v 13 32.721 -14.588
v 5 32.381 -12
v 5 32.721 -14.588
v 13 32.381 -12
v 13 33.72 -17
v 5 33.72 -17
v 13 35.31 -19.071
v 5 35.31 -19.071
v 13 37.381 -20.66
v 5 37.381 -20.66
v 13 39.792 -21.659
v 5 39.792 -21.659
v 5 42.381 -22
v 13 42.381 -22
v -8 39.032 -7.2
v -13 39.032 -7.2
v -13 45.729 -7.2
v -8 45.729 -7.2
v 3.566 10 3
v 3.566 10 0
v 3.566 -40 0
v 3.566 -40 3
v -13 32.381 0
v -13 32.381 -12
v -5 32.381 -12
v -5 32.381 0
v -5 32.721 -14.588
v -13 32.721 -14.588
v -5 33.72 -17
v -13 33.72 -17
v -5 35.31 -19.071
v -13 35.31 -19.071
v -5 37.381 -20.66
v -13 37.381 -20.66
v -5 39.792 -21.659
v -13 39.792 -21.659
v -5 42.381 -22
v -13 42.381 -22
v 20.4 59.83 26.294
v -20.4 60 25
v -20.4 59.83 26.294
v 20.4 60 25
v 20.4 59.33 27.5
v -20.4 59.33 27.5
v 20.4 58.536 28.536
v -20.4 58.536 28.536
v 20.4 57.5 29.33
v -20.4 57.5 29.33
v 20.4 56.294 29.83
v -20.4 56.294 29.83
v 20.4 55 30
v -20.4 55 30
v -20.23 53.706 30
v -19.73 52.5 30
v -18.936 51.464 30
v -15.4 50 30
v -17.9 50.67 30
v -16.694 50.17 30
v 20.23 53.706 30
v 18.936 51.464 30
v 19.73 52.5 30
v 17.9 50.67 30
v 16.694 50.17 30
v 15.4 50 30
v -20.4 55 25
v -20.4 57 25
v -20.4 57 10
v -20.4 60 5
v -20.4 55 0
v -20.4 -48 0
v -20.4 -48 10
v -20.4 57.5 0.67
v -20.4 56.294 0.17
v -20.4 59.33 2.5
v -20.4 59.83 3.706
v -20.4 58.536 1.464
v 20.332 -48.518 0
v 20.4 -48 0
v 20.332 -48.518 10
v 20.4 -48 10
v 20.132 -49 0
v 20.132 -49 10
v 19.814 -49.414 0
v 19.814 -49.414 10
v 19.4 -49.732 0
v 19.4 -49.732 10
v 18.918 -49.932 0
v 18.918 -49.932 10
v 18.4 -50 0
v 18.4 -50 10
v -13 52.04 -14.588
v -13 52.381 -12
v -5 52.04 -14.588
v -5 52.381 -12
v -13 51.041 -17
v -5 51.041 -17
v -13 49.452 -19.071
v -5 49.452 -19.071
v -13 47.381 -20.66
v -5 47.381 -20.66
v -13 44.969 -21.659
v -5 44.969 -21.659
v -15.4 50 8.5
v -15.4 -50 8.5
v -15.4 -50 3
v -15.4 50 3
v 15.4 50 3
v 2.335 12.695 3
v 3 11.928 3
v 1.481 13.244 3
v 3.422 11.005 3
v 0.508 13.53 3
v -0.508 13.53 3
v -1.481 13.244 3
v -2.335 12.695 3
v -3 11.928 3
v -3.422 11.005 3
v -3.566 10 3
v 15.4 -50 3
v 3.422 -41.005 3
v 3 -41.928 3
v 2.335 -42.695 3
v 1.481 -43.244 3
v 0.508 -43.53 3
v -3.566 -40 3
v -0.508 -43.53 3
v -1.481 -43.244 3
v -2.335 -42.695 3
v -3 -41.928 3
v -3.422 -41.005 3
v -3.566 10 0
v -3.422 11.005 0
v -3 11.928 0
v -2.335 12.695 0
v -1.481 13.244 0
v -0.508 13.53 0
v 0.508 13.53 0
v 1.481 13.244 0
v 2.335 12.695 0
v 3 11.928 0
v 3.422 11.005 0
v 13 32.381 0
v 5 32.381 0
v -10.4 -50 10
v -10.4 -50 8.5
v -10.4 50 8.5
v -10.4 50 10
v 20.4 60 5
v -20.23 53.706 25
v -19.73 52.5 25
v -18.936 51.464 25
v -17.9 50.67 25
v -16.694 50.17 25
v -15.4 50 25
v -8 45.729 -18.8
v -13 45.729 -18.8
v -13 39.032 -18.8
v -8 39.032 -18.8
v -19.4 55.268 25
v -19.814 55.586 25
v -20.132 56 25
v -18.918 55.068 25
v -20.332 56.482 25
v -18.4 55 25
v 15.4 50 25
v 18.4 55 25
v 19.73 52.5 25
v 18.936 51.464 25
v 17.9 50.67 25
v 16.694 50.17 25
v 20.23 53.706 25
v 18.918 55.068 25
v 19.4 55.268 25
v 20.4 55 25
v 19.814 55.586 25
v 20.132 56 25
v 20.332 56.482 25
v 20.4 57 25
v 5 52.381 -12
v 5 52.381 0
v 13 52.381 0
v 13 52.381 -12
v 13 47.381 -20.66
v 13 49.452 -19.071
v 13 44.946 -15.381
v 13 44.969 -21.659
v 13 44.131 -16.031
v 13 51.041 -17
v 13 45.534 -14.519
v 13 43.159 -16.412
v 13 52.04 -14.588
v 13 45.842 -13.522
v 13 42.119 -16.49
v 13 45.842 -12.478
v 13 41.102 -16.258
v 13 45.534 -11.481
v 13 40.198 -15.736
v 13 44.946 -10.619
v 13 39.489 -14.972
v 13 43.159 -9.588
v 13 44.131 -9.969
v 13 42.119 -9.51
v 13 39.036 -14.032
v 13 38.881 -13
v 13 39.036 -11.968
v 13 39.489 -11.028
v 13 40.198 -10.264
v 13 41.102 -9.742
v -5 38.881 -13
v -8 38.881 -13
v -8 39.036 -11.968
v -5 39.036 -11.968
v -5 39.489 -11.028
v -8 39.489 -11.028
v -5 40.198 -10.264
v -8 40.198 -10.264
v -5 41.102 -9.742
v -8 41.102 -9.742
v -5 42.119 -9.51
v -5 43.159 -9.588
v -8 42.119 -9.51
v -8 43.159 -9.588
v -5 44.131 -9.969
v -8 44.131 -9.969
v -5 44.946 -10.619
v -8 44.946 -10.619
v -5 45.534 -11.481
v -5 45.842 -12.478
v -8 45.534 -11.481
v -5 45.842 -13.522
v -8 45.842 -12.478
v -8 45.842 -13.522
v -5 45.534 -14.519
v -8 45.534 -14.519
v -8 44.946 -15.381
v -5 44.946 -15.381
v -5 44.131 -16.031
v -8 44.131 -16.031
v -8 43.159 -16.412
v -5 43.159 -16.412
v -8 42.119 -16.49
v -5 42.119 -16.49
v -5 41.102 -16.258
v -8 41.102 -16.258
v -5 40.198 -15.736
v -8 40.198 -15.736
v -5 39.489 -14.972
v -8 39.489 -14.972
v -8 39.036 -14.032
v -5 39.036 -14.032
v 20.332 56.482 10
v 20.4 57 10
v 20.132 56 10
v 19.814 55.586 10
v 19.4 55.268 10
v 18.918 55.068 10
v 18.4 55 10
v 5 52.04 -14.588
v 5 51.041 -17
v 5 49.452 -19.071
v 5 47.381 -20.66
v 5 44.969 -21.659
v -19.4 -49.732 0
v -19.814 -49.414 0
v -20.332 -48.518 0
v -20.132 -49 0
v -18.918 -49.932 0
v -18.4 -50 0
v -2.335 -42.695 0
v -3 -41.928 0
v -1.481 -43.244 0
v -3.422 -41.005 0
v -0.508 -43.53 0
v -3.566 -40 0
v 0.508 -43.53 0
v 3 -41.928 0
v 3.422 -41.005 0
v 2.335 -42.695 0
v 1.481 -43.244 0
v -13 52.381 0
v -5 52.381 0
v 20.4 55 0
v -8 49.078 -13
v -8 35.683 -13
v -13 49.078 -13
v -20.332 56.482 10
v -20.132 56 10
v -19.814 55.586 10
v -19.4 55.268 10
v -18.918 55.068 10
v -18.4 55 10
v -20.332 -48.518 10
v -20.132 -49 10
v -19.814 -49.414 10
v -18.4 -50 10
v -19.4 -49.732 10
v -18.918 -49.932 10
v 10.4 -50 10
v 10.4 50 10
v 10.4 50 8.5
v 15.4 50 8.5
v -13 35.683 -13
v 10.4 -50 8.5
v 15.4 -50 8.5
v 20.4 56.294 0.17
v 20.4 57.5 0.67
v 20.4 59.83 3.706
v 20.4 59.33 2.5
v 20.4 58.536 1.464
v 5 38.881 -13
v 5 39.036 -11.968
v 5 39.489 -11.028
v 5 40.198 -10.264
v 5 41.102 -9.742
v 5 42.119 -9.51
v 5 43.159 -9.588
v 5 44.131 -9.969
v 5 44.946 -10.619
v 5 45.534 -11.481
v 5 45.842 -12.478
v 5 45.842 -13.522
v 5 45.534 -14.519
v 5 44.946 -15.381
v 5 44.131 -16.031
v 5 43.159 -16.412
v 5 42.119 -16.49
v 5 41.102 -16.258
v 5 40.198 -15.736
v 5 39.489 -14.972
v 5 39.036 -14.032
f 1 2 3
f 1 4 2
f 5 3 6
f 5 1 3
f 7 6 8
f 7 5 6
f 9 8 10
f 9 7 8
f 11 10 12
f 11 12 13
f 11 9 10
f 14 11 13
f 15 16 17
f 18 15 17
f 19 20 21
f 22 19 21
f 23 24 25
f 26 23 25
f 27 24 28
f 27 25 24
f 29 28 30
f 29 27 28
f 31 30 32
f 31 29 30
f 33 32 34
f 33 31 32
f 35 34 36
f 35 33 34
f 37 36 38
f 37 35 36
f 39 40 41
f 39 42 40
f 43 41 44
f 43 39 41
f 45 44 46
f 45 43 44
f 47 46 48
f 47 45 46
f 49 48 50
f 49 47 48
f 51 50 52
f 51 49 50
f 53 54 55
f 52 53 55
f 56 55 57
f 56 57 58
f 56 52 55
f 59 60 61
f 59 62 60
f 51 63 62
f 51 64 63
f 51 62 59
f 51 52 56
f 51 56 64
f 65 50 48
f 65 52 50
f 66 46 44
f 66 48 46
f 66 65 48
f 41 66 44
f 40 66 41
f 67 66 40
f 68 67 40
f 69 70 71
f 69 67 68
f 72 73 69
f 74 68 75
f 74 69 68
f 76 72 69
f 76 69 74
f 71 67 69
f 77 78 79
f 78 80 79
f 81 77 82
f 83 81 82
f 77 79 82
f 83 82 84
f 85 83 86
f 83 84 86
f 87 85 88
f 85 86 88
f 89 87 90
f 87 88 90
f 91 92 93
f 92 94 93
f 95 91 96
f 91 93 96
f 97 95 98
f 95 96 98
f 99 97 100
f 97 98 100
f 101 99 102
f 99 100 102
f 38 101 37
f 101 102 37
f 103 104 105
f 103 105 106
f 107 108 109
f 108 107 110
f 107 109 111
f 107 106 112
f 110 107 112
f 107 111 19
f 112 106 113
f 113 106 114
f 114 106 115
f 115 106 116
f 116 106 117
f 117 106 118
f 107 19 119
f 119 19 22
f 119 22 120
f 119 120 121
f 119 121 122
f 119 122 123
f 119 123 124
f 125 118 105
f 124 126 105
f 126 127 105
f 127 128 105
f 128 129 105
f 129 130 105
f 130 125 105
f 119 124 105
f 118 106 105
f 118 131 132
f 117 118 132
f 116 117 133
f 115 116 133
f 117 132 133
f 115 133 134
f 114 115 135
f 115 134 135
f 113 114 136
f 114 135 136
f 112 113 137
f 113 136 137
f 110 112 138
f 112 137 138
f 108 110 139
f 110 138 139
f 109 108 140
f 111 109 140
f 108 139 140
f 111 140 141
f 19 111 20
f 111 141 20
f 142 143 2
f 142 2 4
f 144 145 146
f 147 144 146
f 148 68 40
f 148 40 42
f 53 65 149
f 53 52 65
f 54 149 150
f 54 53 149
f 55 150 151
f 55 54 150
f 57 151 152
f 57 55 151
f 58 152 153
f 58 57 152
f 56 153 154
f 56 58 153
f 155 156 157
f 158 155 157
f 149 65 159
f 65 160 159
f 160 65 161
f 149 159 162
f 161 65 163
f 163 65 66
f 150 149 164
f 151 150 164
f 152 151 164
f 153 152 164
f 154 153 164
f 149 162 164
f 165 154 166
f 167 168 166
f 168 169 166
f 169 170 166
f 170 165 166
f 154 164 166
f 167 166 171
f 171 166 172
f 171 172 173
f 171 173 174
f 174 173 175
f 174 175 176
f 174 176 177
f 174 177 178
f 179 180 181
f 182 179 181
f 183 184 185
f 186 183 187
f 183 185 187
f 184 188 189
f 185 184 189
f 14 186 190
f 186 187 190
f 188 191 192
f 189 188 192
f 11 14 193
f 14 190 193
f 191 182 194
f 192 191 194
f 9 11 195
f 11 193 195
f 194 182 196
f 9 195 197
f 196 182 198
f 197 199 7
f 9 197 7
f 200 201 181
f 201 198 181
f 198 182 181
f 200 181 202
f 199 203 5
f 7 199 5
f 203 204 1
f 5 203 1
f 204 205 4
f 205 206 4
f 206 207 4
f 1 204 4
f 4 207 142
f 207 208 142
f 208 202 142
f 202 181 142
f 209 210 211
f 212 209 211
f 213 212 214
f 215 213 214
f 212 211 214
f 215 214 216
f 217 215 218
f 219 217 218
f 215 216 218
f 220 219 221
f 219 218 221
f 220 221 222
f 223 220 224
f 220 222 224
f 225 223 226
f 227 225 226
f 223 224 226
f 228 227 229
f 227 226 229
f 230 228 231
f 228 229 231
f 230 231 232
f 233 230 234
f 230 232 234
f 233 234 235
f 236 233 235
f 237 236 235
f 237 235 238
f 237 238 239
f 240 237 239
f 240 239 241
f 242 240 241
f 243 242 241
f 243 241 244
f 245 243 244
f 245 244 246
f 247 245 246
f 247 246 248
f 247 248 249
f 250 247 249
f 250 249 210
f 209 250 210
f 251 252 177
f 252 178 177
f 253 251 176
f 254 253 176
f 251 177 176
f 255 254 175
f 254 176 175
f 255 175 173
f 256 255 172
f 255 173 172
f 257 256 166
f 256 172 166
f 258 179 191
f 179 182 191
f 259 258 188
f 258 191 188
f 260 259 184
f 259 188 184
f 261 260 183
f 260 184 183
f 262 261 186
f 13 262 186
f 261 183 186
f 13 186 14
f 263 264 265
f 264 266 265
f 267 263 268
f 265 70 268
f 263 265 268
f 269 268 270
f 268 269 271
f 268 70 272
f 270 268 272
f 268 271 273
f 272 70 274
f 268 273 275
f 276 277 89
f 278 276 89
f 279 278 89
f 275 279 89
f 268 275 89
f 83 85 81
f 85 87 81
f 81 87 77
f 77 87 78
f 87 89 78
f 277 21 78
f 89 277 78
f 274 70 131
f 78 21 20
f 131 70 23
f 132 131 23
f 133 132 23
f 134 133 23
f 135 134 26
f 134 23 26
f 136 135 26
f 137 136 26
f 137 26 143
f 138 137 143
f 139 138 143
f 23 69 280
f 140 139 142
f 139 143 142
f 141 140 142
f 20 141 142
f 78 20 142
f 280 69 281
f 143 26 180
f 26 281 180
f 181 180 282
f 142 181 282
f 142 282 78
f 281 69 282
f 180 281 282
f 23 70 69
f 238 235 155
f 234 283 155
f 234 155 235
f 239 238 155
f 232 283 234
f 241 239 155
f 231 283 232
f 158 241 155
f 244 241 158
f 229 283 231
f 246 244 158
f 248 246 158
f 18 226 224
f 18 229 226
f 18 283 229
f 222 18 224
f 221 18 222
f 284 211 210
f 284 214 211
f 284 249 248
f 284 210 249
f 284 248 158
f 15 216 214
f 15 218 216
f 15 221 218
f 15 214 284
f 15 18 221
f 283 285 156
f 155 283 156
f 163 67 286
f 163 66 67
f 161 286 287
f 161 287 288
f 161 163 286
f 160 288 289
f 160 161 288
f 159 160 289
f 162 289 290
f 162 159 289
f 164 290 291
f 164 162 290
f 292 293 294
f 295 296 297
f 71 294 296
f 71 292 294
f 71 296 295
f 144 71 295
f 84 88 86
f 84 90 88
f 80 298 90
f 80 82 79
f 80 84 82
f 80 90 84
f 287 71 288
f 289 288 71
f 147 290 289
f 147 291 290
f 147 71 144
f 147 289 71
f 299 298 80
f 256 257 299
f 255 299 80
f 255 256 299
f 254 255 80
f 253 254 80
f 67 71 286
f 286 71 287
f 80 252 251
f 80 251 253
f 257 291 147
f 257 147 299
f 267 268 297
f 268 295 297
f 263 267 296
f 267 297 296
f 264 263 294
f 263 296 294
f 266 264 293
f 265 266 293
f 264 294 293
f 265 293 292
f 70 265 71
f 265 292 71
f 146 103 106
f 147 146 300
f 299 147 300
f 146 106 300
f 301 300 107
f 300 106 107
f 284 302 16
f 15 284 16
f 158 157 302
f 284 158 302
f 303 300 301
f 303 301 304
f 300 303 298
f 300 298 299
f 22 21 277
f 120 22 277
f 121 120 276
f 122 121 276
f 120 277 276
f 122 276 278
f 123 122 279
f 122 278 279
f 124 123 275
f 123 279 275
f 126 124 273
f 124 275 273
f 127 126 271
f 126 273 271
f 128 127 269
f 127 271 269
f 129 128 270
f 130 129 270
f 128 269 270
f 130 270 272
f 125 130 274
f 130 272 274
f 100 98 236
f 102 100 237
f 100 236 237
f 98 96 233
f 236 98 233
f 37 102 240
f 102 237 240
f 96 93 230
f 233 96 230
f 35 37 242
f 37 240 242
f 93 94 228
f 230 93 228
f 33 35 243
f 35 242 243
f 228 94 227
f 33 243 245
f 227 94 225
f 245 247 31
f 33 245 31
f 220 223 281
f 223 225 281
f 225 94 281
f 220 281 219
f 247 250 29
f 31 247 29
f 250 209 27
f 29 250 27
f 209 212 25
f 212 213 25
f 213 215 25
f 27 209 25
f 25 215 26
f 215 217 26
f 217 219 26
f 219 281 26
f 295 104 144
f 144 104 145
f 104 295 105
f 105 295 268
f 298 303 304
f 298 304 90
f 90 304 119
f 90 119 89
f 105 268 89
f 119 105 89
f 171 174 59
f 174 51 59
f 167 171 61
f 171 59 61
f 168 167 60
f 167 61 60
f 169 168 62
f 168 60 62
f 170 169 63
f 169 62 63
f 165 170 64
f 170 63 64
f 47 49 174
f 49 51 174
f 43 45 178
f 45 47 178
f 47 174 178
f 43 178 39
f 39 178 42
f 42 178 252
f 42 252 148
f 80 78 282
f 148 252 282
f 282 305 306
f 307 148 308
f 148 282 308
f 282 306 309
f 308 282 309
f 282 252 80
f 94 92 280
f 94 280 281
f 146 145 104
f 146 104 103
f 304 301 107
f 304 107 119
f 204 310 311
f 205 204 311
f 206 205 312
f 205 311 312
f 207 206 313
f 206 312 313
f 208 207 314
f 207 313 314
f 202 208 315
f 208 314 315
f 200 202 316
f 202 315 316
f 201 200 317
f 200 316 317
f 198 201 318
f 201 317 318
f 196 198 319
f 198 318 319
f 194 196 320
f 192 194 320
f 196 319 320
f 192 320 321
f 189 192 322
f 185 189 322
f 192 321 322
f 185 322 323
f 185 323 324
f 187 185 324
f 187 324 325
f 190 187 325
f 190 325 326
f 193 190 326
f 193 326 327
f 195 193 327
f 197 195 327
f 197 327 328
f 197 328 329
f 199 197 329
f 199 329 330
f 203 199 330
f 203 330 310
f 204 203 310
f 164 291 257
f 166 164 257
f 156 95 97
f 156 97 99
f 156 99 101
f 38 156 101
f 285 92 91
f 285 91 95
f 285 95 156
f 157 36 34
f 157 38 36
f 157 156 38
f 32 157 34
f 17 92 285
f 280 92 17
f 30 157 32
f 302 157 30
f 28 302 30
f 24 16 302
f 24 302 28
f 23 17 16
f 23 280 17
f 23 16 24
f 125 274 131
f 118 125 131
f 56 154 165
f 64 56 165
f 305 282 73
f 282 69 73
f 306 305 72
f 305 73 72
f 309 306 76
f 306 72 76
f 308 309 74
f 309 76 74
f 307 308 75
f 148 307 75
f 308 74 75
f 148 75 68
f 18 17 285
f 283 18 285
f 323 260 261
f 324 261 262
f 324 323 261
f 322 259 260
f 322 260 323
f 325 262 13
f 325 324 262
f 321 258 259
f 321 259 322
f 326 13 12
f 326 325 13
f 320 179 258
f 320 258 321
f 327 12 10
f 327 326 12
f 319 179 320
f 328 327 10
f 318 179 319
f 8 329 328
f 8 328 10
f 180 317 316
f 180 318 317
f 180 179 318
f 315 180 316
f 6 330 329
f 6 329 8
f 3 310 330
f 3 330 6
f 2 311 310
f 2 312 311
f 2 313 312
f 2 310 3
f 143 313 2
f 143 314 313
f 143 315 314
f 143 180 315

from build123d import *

# Parameters (mm, degrees)
F0_W      = 10
F0_H      = 100
F1_DEPTH  = 10
F0_W_2    = 20.8
F2_DEPTH  = 5
F3_W      = 40.8
F3_H      = 5
F4_DEPTH  = 15
F5_W      = 40.8
F5_H      = 10
F6_DEPTH  = 5
F7_W      = 8
F7_H      = 20
F8_DEPTH  = 22
F9_R      = 3.5
F10_DEPTH = 33.401
F11_DEPTH = 5
F12_R     = 9.99999
F13_R     = 4.99999
F14_R     = 2
F15_W     = 100
F15_H     = 3.5
F16_DEPTH = 5
F17_W     = 100
F17_H     = 3.5
F18_DEPTH = 5
F19_DEPTH = 2


# Not quite as in the source:
# - a fillet or chamfer is up to 0.001 mm smaller than in the source, because OpenCascade refuses the exact size


with BuildPart() as f1:
    # F0 (on Top) → F1 (new body)
    with BuildSketch(Plane.XY):
        with Locations((-15.4, 0)):
            Rectangle(F0_W, F0_H)
        Polygon((-10.4, 50), (10.4, 50), (20.4, 50), (20.4, 60), (-20.4, 60), (-20.4, 50), align=None)
        with Locations((15.4, 0)):
            Rectangle(F0_W, F0_H)
    extrude(amount=F1_DEPTH)

    # F0 (on Top) → F2 (join)
    with BuildSketch(Plane.XY):
        Rectangle(F0_W_2, F0_H)
        with BuildLine():
            Line((3.5661098082, 10), (3.5661098082, -40))
            ThreePointArc((3.5661098082, -40), (0, -43.5661098082), (-3.5661098082, -40))
            Line((-3.5661098082, -40), (-3.5661098082, 10))
            ThreePointArc((-3.5661098082, 10), (0, 13.5661098082), (3.5661098082, 10))
        make_face(mode=Mode.SUBTRACT)
    extrude(amount=F2_DEPTH)

    # F3 (on face) → F4 (join)
    with BuildSketch(Plane.XY.offset(10)):
        with Locations((0, 57.5)):
            Rectangle(F3_W, F3_H)
    extrude(amount=F4_DEPTH)

    # F5 (on face) → F6 (join)
    with BuildSketch(Plane.XY.offset(25)):
        with Locations((0, 55)):
            Rectangle(F5_W, F5_H)
    extrude(amount=F6_DEPTH)

    # F7 (on face) → F8 (join)
    with BuildSketch(Plane(origin=(0, 0, 0), x_dir=(1, 0, 0), z_dir=(0, 0, -1))):
        with Locations((9, -42.3806495965)):
            Rectangle(F7_W, F7_H)
        with Locations((-9, -42.3806495965)):
            Rectangle(F7_W, F7_H)
    extrude(amount=F8_DEPTH)

    # F9 (on face) → F10 (cut, through all)
    with BuildSketch(Plane(origin=(-13, 0, 0), x_dir=(0, -1, 0), z_dir=(-1, 0, 0))):
        with Locations((-42.3806495965, -13)):
            Circle(F9_R)
    extrude(amount=-F10_DEPTH, mode=Mode.SUBTRACT)

    # F9 (on face) → F11 (cut)
    with BuildSketch(Plane(origin=(-13, 0, 0), x_dir=(0, -1, 0), z_dir=(-1, 0, 0))):
        Polygon((-39.0320180352, -7.2), (-45.7292811578, -7.2), (-49.0779127191, -13), (-45.7292811578, -18.8), (-39.0320180352, -18.8), (-35.6833864739, -13), align=None)
        with Locations((-42.3806495965, -13)):
            Circle(F9_R, mode=Mode.SUBTRACT)
    extrude(amount=-F11_DEPTH, mode=Mode.SUBTRACT)

    # F12 (radius 10 in the source; OpenCascade refuses exactly that, so slightly less here)
    f12_edges = [f1.edges().sort_by_distance(p)[0] for p in [
        (-9, 52.38065, -22),
        (9, 52.38065, -22),
        (9, 32.38065, -22),
        (-9, 32.38065, -22),
    ]]
    fillet(f12_edges, radius=F12_R)

    # F13 (radius 5 in the source; OpenCascade refuses exactly that, so slightly less here)
    f13_edges = [f1.edges().sort_by_distance(p)[0] for p in [
        (-20.4, 50, 27.5),
        (20.4, 50, 27.5),
        (0, 60, 30),
        (0, 60, 0),
    ]]
    fillet(f13_edges, radius=F13_R)

    # F14
    f14_edges = [f1.edges().sort_by_distance(p)[0] for p in [
        (-20.4, 55, 17.5),
        (20.4, 55, 17.5),
        (-20.4, -50, 5),
        (20.4, -50, 5),
    ]]
    fillet(f14_edges, radius=F14_R)

    # F15 (on face) → F16 (cut)
    with BuildSketch(Plane.YZ.offset(-10.4)):
        with Locations((0, 6.75)):
            Rectangle(F15_W, F15_H)
    extrude(amount=-F16_DEPTH, mode=Mode.SUBTRACT)

    # F17 (on face) → F18 (cut)
    with BuildSketch(Plane(origin=(10.4, 0, 0), x_dir=(0, -1, 0), z_dir=(-1, 0, 0))):
        with Locations((0, 6.75)):
            Rectangle(F17_W, F17_H)
    extrude(amount=-F18_DEPTH, mode=Mode.SUBTRACT)

    # F19 (cut): a face of the model
    f19_faces = [f1.faces().sort_by_distance(p)[0] for p in [
        (0, 48.9536425085, 5),
    ]]
    extrude(f19_faces, amount=-F19_DEPTH, mode=Mode.SUBTRACT)


solid = f1.part
